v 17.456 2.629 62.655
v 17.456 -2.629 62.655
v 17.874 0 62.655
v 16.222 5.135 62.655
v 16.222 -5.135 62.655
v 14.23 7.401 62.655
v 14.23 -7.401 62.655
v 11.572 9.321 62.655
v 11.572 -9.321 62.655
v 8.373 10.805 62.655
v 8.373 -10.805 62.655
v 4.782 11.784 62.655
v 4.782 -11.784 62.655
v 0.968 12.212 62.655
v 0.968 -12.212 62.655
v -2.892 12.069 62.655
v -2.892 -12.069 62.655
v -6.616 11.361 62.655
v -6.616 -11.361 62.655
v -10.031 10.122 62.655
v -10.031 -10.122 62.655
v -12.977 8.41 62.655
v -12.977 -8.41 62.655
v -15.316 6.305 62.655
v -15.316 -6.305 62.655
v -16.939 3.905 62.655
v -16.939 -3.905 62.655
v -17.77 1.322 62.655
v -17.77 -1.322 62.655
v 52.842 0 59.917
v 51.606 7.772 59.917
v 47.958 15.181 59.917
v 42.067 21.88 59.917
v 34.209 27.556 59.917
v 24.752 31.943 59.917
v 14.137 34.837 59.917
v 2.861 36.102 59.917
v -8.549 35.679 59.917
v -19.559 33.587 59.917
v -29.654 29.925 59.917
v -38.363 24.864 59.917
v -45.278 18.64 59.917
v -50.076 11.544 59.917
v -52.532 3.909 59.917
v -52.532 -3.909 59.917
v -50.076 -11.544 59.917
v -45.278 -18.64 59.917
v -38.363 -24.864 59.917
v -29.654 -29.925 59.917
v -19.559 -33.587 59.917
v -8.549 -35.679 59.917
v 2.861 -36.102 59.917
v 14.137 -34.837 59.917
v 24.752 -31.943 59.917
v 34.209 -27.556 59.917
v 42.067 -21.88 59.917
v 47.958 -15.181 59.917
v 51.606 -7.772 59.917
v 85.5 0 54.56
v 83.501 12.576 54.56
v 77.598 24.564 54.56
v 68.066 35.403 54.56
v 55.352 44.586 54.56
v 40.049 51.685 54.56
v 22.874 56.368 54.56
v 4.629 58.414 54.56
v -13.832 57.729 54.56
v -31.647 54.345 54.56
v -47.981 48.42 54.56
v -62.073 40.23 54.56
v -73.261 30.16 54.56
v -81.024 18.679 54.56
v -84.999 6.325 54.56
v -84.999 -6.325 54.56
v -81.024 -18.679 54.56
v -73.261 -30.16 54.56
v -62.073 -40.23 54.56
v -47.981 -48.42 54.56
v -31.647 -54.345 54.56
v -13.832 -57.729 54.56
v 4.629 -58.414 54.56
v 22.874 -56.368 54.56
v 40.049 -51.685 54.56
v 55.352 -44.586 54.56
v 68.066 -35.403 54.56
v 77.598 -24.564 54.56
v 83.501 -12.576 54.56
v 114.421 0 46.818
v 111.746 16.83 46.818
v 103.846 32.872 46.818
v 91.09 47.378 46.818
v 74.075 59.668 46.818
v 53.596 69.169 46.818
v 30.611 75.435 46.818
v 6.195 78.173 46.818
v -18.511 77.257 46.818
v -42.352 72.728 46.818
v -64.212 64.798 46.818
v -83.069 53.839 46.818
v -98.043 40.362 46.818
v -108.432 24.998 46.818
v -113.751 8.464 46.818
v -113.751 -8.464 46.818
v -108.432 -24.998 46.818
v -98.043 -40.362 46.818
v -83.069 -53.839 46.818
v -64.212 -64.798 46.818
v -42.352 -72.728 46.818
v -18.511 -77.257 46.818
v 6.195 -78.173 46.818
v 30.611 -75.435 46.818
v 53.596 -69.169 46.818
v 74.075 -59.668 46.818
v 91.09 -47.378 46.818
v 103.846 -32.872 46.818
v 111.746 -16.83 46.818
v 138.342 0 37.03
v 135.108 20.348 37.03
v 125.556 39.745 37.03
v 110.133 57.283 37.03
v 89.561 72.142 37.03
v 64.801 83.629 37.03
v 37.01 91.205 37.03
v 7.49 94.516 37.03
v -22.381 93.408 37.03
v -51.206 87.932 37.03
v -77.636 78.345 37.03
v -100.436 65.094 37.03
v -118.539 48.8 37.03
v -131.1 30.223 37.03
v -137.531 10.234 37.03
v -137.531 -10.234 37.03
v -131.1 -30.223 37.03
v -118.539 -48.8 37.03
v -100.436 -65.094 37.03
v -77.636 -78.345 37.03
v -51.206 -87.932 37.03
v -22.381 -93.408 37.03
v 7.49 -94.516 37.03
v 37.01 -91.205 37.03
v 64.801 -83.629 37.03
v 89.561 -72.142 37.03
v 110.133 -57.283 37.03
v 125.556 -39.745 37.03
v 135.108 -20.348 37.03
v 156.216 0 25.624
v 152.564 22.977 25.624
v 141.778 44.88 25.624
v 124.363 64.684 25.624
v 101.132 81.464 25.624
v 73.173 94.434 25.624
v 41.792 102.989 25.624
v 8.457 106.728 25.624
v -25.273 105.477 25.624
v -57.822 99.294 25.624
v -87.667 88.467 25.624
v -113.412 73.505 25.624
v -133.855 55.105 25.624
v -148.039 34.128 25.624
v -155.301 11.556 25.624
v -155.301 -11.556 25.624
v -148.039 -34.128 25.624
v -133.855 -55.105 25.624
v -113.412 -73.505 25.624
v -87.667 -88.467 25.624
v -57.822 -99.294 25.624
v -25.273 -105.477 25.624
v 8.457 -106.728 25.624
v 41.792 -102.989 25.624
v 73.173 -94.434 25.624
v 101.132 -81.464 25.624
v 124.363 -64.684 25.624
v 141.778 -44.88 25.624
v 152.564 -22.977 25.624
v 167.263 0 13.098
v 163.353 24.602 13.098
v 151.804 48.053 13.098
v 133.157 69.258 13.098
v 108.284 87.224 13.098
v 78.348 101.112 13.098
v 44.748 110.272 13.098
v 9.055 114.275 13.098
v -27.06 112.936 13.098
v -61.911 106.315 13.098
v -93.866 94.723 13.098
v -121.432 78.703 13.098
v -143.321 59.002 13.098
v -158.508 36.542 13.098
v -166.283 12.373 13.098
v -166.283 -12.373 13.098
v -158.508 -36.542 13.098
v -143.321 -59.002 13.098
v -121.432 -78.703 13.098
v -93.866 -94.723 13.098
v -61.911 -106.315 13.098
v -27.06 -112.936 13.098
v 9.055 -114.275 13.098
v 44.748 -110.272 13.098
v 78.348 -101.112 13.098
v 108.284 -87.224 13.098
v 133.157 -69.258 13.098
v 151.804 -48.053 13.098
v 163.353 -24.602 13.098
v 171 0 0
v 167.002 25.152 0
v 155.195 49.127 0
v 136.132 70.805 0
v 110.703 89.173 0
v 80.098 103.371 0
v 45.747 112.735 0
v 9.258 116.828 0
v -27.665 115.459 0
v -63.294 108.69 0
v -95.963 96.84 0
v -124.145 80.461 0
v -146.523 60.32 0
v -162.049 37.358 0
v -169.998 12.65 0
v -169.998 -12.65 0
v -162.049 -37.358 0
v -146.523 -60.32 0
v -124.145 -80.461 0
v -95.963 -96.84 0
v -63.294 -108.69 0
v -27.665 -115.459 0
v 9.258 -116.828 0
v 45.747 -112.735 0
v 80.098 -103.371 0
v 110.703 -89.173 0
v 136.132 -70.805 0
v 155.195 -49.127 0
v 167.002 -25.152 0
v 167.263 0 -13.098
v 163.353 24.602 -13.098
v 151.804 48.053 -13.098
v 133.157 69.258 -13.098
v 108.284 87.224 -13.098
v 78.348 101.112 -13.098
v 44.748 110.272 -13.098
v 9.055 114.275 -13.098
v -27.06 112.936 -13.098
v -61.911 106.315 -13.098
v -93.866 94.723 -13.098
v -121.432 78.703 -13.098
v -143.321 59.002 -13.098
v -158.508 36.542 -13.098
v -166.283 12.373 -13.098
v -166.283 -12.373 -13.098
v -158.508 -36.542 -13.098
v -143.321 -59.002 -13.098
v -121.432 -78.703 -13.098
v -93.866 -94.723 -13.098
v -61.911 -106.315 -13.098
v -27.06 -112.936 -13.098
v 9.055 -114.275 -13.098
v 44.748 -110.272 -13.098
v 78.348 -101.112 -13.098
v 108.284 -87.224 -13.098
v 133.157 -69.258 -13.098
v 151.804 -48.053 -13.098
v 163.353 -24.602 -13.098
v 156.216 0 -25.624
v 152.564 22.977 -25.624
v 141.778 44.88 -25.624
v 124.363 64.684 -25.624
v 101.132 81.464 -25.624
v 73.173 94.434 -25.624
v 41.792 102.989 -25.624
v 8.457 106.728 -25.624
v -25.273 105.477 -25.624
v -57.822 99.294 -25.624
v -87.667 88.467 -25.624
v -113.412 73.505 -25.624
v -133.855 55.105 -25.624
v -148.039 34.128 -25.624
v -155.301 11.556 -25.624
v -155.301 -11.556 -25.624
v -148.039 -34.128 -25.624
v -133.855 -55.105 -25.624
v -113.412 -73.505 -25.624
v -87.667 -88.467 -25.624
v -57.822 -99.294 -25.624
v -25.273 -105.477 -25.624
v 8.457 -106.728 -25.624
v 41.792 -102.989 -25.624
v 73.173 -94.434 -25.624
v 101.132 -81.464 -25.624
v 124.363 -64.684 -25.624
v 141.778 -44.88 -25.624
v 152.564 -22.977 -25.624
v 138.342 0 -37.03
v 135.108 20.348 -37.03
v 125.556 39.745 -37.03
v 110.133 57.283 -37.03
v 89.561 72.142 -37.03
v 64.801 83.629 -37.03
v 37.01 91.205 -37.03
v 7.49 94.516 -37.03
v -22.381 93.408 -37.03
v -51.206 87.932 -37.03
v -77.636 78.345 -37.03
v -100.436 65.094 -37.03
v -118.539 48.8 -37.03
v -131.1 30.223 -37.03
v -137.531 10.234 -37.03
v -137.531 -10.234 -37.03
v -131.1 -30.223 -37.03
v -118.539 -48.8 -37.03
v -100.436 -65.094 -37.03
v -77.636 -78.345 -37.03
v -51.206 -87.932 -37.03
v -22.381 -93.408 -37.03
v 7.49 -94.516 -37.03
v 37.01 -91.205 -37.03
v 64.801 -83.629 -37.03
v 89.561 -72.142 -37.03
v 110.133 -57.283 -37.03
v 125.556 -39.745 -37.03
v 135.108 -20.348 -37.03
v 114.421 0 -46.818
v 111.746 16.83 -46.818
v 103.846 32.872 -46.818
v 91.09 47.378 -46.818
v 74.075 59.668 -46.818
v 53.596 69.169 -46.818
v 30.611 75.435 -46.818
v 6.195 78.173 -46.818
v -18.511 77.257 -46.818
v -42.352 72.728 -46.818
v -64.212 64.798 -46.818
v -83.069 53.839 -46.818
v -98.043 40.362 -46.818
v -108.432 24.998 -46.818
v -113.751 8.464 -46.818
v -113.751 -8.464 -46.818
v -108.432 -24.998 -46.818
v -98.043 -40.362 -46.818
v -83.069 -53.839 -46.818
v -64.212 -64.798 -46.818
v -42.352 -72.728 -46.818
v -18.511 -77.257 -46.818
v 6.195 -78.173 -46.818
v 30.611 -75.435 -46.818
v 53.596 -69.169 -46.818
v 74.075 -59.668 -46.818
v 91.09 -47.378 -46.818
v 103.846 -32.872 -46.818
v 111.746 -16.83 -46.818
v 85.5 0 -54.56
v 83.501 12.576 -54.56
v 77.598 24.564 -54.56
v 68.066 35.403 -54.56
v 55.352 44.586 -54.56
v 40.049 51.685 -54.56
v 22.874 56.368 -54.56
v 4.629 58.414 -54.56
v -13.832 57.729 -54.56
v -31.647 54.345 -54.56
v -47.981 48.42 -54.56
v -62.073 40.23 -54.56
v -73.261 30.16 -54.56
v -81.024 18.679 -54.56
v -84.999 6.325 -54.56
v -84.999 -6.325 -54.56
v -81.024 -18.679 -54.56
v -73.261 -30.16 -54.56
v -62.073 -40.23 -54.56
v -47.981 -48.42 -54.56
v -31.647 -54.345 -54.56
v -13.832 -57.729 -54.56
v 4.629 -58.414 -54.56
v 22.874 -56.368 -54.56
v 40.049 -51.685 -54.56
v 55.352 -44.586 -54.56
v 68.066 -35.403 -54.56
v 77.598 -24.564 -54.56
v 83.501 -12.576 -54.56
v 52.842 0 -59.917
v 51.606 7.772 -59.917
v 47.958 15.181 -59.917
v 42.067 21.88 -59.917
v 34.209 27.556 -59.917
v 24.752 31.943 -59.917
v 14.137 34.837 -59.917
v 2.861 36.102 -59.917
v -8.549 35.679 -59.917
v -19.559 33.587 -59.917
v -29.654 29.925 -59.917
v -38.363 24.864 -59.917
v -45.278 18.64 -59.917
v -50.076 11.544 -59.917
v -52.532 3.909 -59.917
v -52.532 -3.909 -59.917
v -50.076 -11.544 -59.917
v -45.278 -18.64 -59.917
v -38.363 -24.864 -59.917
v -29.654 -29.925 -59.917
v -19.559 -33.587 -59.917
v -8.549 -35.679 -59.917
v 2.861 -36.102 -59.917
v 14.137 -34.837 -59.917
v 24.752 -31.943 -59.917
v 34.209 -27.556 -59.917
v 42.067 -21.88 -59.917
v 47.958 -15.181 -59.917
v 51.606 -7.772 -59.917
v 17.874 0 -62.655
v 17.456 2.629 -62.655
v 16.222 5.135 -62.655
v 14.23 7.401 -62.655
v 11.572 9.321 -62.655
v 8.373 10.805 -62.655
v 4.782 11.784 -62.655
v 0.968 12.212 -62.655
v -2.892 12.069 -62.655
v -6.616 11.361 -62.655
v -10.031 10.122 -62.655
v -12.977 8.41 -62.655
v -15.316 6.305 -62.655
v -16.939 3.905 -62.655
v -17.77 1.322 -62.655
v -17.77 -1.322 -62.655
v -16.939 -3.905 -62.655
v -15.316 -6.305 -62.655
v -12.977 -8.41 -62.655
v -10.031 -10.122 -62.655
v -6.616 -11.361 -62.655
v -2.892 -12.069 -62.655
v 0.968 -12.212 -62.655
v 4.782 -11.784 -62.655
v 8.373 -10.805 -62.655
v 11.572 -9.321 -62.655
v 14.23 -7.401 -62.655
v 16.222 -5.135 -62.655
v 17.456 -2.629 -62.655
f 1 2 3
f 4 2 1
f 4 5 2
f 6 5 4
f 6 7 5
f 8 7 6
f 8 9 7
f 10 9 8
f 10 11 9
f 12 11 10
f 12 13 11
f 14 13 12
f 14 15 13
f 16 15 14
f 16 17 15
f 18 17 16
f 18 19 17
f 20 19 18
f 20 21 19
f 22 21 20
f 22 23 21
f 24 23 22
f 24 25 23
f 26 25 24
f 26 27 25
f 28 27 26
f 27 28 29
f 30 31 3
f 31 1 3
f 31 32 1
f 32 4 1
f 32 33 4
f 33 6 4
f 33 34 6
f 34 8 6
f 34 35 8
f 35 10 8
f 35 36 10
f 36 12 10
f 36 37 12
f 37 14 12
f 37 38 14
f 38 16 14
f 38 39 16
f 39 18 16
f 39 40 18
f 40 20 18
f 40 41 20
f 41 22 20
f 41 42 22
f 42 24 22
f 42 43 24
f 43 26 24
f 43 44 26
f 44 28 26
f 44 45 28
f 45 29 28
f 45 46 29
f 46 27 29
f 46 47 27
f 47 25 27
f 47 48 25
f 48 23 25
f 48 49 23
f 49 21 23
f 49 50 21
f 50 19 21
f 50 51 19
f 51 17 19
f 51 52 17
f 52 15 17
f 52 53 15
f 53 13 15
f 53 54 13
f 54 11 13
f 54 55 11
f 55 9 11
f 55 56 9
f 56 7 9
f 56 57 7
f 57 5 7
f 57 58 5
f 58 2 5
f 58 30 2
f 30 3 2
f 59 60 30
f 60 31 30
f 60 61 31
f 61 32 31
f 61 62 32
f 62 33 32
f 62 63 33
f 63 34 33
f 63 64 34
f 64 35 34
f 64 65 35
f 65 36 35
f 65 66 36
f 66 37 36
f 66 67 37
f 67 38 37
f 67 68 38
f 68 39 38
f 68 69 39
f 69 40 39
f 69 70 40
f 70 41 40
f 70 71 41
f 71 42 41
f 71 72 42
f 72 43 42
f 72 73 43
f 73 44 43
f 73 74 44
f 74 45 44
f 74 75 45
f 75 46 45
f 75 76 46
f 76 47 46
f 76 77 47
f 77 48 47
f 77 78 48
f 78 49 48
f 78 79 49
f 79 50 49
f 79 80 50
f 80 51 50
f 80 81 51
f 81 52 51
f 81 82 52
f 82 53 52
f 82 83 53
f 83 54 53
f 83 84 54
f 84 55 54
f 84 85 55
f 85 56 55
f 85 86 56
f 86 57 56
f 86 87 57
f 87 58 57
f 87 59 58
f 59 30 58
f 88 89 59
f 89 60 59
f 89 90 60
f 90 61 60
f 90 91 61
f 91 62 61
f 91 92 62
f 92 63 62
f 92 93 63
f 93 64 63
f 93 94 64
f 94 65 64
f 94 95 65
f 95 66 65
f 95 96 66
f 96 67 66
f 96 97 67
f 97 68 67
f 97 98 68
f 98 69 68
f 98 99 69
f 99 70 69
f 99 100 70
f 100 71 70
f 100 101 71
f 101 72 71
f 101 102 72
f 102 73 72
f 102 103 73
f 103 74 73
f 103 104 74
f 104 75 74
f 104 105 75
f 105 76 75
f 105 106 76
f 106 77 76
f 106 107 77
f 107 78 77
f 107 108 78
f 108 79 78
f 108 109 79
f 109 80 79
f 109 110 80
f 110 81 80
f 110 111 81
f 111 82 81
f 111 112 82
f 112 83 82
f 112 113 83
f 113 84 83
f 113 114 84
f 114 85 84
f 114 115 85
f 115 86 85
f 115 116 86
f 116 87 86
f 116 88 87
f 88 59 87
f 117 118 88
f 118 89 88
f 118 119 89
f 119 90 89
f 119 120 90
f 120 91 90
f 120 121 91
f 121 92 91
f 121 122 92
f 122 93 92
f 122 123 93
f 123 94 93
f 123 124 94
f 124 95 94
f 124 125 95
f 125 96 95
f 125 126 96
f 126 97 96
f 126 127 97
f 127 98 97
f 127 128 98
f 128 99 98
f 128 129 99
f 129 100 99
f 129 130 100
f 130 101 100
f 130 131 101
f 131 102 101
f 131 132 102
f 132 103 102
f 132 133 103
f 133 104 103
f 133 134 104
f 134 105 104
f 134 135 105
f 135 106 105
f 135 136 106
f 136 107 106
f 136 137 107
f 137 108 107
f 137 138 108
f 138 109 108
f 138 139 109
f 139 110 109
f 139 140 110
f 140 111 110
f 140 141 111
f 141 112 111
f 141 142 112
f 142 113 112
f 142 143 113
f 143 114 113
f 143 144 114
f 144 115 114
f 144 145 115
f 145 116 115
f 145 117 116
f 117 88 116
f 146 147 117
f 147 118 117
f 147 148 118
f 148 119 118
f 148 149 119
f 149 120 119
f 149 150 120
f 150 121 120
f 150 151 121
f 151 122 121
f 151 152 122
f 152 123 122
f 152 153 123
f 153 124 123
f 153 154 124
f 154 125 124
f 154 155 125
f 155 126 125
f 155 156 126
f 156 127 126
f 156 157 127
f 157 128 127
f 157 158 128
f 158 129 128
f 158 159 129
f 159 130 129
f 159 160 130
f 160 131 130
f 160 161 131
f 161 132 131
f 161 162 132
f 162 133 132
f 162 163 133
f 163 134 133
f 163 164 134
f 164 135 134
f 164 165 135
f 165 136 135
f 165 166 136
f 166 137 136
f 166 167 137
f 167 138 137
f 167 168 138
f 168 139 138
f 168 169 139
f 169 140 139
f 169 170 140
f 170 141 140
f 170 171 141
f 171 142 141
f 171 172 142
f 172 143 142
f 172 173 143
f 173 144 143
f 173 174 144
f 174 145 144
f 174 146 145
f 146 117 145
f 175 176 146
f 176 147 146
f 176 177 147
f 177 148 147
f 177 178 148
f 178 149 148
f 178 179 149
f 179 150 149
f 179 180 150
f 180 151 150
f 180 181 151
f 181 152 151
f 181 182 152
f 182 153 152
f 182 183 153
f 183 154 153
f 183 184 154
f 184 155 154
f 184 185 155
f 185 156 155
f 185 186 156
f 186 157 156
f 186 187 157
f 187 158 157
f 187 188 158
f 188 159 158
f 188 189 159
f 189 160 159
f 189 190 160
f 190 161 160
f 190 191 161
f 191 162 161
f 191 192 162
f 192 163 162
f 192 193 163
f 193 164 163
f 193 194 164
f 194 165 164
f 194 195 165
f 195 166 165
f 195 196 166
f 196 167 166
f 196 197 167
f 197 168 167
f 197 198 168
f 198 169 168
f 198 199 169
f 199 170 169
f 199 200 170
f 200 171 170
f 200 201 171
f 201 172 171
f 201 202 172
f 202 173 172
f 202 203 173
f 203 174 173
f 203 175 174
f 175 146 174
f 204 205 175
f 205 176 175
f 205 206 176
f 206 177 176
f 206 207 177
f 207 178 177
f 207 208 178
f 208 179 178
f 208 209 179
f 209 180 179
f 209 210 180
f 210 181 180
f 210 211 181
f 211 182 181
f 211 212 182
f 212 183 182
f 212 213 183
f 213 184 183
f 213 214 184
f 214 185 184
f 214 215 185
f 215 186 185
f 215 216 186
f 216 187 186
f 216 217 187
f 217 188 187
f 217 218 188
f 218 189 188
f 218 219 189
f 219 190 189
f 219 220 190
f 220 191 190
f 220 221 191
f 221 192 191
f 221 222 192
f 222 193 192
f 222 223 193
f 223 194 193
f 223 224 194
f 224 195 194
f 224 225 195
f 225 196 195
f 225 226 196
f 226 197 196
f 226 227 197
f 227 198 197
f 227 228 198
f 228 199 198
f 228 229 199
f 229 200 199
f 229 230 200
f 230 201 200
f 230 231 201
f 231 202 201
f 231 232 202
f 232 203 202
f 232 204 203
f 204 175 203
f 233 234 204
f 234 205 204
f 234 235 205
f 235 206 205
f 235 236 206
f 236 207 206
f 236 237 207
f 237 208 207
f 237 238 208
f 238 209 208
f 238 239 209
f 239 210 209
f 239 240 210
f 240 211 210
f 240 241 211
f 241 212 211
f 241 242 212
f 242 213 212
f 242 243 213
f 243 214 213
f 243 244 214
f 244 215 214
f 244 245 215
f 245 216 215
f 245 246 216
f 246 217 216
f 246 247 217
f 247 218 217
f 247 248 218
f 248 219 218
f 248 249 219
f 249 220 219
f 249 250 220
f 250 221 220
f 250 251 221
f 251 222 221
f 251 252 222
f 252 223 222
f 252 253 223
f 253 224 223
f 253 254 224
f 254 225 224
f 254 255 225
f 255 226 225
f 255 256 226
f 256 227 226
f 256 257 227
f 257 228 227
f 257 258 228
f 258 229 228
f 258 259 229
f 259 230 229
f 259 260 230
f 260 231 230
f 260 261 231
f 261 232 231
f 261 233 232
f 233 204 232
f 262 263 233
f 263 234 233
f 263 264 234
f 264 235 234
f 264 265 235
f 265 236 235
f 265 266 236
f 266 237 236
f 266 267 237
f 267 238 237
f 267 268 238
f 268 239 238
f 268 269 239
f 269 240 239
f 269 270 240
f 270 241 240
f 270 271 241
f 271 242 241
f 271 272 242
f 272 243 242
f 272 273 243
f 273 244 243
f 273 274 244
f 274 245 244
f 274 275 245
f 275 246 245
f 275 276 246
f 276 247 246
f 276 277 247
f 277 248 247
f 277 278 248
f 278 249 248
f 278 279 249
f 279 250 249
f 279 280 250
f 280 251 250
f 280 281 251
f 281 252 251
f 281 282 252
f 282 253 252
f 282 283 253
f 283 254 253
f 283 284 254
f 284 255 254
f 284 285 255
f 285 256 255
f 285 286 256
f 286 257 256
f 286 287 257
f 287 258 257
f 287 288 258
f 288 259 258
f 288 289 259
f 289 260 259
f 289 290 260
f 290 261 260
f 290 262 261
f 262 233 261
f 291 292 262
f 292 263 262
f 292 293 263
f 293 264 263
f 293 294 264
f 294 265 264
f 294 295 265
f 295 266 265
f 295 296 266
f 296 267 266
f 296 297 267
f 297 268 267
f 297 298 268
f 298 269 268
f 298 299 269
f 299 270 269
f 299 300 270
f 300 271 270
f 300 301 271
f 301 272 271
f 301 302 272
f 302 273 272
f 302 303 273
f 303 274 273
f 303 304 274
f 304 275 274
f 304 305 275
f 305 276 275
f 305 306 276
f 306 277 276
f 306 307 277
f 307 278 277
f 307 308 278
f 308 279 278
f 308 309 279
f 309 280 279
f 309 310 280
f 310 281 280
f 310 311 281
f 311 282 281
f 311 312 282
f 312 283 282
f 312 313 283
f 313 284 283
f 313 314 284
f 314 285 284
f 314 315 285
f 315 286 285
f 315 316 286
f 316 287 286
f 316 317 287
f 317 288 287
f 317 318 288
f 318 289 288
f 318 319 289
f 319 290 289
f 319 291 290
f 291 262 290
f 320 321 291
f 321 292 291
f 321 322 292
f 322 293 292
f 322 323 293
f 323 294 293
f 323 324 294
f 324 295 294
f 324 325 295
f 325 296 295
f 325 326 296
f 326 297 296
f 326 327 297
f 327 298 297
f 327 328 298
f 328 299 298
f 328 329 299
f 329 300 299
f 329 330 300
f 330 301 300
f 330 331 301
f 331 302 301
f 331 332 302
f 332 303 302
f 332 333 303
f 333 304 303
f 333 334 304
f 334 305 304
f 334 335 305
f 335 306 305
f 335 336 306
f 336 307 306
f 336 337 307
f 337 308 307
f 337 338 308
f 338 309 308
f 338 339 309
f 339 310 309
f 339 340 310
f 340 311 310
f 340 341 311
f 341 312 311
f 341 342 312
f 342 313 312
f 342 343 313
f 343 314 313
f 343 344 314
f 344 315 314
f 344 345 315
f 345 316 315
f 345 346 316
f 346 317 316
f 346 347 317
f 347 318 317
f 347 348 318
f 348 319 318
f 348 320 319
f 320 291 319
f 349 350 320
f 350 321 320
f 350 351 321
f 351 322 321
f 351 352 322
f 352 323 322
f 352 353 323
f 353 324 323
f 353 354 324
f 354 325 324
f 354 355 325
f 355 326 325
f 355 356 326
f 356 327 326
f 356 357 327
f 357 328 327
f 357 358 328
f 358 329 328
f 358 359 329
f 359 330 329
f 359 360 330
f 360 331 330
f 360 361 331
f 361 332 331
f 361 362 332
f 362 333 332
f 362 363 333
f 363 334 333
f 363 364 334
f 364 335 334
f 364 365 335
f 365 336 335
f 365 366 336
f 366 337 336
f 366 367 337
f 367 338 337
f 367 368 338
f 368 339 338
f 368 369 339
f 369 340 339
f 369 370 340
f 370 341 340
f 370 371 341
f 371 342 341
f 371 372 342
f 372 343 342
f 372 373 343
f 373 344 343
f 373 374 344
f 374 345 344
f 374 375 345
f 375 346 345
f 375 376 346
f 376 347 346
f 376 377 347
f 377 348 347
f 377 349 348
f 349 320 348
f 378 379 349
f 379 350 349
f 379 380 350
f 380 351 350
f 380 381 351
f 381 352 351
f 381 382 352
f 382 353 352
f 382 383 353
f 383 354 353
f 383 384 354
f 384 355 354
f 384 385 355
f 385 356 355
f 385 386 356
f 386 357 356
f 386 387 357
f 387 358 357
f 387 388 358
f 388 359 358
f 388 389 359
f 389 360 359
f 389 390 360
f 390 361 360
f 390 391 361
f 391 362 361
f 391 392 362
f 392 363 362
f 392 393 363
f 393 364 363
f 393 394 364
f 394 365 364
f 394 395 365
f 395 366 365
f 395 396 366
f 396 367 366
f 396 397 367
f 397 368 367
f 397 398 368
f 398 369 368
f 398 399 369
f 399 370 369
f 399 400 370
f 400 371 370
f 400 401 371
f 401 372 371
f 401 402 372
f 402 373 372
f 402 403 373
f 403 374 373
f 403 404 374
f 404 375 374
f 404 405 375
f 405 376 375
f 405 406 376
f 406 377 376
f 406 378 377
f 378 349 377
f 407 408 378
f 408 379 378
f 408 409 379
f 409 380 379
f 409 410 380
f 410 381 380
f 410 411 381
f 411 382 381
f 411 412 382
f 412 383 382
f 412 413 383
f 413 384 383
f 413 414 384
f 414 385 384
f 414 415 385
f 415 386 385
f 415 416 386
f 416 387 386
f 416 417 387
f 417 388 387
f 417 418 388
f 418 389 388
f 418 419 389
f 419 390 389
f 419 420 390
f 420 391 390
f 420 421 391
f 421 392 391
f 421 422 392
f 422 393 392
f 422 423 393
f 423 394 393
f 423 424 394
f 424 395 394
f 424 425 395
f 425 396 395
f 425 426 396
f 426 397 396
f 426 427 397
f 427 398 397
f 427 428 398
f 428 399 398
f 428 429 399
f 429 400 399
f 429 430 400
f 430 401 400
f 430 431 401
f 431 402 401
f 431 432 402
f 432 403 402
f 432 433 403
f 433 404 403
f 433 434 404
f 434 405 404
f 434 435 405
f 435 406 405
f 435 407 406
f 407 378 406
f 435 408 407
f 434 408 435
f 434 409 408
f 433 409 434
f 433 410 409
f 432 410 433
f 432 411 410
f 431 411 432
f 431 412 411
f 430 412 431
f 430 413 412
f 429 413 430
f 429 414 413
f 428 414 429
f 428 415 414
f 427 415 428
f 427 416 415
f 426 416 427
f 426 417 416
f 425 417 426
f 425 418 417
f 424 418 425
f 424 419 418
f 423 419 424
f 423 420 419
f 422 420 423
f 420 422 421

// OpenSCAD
// Generated by SolidPython 1.0.1 on 2020-07-29 00:46:54


scale(v = [19, 13, 7]) {
	sphere(r = 9);
}
/***********************************************
*********      SolidPython code:      **********
************************************************
 
# import packages: SolidPython
from solid import *
from solid.utils import *
from itertools import chain, combinations, permutations


class Resize:

    def __init__(self, scad_file):
        self.scad_file = scad_file
        #self.scad_file = import_scad(scad_file)
        # cone/cylinder param:
        self.r1 = 0
        self.r2 = 0
        self.h = 0
        # rectangular prism param:
        self.w = 0
        self.l = 0
        # ellipse param:
        self.r = 0

    # import OpenScad code (file name corresponds to shape)


    # classify shape + parameters
    def assign(self, param1, param2, param3):
        if self.scad_file == 'cone.scad':
            self.r1 = param1
            self.r2 = param2
            self.h = param3
        elif self.scad_file == 'cylinder.scad':
            self.r1 = param1
            self.r2 = param2
            self.h = param3
        elif self.scad_file == 'rectangularPrism.scad':
            self.h = param1
            self.l = param2
            self.w = param3
        else:
            self.r = param1
            self.h = param2

    # resize parameters
    def iterate(self):
        x = range(3, 20, 2)
        i = 1
        if self.scad_file == 'cone.scad':
            tempList = list(permutations(x, 2))
            for temp in tempList:
                param1 = temp[0]
                param2 = temp[1]
                filepath = 'produced_scad_files/' + 'cone' + str(param1) + '_' + str(param2) + '_' + '.scad'
                scad_render_to_file(cylinder(h=param1, r1=param2, r2=0), filepath)

        elif self.scad_file == 'cylinder.scad':
            tempList = list(permutations(x, 3))
            for temp in tempList:
                param1 = temp[0]
                param2 = temp[1]
                filepath = 'produced_scad_files/' + 'cylinder' + str(param1) + '_' + str(param2) + '_' + '.scad'
                scad_render_to_file(cylinder(h=param1, r1=param2, r2=param2), filepath)

        elif self.scad_file == 'rectangularPrism.scad':
            tempList = list(permutations(x, 3))
            for temp in tempList:
                param1 = temp[0]
                param2 = temp[1]
                param3 = temp[2]
                filepath = 'produced_scad_files/' + 'rectangularPrism' + str(param1) + '_' + str(param2) + '_' + str(
                    param3) + '.scad'
                scad_render_to_file(cube(size=(param1, param2, param3)), filepath)

        elif self.scad_file == 'ellipse.scad':
            tempList = list(permutations(x, 4))
            for temp in tempList:
                param1 = temp[0]
                param2 = temp[1]
                param3 = temp[2]
                param4 = temp[3]
                filepath = 'produced_scad_files/' + 'ellipse' + str(param1) + '_' + str(param2) + '_' + str(param3) + '_' + str(param4) + '.scad'
                scad_render_to_file(scale([param1, param2, param3])(sphere(r=param4)), filepath)

    def render_to_scadfile(self):
        scad_render_to_file(scad, 'example.scad') 
 
************************************************/
